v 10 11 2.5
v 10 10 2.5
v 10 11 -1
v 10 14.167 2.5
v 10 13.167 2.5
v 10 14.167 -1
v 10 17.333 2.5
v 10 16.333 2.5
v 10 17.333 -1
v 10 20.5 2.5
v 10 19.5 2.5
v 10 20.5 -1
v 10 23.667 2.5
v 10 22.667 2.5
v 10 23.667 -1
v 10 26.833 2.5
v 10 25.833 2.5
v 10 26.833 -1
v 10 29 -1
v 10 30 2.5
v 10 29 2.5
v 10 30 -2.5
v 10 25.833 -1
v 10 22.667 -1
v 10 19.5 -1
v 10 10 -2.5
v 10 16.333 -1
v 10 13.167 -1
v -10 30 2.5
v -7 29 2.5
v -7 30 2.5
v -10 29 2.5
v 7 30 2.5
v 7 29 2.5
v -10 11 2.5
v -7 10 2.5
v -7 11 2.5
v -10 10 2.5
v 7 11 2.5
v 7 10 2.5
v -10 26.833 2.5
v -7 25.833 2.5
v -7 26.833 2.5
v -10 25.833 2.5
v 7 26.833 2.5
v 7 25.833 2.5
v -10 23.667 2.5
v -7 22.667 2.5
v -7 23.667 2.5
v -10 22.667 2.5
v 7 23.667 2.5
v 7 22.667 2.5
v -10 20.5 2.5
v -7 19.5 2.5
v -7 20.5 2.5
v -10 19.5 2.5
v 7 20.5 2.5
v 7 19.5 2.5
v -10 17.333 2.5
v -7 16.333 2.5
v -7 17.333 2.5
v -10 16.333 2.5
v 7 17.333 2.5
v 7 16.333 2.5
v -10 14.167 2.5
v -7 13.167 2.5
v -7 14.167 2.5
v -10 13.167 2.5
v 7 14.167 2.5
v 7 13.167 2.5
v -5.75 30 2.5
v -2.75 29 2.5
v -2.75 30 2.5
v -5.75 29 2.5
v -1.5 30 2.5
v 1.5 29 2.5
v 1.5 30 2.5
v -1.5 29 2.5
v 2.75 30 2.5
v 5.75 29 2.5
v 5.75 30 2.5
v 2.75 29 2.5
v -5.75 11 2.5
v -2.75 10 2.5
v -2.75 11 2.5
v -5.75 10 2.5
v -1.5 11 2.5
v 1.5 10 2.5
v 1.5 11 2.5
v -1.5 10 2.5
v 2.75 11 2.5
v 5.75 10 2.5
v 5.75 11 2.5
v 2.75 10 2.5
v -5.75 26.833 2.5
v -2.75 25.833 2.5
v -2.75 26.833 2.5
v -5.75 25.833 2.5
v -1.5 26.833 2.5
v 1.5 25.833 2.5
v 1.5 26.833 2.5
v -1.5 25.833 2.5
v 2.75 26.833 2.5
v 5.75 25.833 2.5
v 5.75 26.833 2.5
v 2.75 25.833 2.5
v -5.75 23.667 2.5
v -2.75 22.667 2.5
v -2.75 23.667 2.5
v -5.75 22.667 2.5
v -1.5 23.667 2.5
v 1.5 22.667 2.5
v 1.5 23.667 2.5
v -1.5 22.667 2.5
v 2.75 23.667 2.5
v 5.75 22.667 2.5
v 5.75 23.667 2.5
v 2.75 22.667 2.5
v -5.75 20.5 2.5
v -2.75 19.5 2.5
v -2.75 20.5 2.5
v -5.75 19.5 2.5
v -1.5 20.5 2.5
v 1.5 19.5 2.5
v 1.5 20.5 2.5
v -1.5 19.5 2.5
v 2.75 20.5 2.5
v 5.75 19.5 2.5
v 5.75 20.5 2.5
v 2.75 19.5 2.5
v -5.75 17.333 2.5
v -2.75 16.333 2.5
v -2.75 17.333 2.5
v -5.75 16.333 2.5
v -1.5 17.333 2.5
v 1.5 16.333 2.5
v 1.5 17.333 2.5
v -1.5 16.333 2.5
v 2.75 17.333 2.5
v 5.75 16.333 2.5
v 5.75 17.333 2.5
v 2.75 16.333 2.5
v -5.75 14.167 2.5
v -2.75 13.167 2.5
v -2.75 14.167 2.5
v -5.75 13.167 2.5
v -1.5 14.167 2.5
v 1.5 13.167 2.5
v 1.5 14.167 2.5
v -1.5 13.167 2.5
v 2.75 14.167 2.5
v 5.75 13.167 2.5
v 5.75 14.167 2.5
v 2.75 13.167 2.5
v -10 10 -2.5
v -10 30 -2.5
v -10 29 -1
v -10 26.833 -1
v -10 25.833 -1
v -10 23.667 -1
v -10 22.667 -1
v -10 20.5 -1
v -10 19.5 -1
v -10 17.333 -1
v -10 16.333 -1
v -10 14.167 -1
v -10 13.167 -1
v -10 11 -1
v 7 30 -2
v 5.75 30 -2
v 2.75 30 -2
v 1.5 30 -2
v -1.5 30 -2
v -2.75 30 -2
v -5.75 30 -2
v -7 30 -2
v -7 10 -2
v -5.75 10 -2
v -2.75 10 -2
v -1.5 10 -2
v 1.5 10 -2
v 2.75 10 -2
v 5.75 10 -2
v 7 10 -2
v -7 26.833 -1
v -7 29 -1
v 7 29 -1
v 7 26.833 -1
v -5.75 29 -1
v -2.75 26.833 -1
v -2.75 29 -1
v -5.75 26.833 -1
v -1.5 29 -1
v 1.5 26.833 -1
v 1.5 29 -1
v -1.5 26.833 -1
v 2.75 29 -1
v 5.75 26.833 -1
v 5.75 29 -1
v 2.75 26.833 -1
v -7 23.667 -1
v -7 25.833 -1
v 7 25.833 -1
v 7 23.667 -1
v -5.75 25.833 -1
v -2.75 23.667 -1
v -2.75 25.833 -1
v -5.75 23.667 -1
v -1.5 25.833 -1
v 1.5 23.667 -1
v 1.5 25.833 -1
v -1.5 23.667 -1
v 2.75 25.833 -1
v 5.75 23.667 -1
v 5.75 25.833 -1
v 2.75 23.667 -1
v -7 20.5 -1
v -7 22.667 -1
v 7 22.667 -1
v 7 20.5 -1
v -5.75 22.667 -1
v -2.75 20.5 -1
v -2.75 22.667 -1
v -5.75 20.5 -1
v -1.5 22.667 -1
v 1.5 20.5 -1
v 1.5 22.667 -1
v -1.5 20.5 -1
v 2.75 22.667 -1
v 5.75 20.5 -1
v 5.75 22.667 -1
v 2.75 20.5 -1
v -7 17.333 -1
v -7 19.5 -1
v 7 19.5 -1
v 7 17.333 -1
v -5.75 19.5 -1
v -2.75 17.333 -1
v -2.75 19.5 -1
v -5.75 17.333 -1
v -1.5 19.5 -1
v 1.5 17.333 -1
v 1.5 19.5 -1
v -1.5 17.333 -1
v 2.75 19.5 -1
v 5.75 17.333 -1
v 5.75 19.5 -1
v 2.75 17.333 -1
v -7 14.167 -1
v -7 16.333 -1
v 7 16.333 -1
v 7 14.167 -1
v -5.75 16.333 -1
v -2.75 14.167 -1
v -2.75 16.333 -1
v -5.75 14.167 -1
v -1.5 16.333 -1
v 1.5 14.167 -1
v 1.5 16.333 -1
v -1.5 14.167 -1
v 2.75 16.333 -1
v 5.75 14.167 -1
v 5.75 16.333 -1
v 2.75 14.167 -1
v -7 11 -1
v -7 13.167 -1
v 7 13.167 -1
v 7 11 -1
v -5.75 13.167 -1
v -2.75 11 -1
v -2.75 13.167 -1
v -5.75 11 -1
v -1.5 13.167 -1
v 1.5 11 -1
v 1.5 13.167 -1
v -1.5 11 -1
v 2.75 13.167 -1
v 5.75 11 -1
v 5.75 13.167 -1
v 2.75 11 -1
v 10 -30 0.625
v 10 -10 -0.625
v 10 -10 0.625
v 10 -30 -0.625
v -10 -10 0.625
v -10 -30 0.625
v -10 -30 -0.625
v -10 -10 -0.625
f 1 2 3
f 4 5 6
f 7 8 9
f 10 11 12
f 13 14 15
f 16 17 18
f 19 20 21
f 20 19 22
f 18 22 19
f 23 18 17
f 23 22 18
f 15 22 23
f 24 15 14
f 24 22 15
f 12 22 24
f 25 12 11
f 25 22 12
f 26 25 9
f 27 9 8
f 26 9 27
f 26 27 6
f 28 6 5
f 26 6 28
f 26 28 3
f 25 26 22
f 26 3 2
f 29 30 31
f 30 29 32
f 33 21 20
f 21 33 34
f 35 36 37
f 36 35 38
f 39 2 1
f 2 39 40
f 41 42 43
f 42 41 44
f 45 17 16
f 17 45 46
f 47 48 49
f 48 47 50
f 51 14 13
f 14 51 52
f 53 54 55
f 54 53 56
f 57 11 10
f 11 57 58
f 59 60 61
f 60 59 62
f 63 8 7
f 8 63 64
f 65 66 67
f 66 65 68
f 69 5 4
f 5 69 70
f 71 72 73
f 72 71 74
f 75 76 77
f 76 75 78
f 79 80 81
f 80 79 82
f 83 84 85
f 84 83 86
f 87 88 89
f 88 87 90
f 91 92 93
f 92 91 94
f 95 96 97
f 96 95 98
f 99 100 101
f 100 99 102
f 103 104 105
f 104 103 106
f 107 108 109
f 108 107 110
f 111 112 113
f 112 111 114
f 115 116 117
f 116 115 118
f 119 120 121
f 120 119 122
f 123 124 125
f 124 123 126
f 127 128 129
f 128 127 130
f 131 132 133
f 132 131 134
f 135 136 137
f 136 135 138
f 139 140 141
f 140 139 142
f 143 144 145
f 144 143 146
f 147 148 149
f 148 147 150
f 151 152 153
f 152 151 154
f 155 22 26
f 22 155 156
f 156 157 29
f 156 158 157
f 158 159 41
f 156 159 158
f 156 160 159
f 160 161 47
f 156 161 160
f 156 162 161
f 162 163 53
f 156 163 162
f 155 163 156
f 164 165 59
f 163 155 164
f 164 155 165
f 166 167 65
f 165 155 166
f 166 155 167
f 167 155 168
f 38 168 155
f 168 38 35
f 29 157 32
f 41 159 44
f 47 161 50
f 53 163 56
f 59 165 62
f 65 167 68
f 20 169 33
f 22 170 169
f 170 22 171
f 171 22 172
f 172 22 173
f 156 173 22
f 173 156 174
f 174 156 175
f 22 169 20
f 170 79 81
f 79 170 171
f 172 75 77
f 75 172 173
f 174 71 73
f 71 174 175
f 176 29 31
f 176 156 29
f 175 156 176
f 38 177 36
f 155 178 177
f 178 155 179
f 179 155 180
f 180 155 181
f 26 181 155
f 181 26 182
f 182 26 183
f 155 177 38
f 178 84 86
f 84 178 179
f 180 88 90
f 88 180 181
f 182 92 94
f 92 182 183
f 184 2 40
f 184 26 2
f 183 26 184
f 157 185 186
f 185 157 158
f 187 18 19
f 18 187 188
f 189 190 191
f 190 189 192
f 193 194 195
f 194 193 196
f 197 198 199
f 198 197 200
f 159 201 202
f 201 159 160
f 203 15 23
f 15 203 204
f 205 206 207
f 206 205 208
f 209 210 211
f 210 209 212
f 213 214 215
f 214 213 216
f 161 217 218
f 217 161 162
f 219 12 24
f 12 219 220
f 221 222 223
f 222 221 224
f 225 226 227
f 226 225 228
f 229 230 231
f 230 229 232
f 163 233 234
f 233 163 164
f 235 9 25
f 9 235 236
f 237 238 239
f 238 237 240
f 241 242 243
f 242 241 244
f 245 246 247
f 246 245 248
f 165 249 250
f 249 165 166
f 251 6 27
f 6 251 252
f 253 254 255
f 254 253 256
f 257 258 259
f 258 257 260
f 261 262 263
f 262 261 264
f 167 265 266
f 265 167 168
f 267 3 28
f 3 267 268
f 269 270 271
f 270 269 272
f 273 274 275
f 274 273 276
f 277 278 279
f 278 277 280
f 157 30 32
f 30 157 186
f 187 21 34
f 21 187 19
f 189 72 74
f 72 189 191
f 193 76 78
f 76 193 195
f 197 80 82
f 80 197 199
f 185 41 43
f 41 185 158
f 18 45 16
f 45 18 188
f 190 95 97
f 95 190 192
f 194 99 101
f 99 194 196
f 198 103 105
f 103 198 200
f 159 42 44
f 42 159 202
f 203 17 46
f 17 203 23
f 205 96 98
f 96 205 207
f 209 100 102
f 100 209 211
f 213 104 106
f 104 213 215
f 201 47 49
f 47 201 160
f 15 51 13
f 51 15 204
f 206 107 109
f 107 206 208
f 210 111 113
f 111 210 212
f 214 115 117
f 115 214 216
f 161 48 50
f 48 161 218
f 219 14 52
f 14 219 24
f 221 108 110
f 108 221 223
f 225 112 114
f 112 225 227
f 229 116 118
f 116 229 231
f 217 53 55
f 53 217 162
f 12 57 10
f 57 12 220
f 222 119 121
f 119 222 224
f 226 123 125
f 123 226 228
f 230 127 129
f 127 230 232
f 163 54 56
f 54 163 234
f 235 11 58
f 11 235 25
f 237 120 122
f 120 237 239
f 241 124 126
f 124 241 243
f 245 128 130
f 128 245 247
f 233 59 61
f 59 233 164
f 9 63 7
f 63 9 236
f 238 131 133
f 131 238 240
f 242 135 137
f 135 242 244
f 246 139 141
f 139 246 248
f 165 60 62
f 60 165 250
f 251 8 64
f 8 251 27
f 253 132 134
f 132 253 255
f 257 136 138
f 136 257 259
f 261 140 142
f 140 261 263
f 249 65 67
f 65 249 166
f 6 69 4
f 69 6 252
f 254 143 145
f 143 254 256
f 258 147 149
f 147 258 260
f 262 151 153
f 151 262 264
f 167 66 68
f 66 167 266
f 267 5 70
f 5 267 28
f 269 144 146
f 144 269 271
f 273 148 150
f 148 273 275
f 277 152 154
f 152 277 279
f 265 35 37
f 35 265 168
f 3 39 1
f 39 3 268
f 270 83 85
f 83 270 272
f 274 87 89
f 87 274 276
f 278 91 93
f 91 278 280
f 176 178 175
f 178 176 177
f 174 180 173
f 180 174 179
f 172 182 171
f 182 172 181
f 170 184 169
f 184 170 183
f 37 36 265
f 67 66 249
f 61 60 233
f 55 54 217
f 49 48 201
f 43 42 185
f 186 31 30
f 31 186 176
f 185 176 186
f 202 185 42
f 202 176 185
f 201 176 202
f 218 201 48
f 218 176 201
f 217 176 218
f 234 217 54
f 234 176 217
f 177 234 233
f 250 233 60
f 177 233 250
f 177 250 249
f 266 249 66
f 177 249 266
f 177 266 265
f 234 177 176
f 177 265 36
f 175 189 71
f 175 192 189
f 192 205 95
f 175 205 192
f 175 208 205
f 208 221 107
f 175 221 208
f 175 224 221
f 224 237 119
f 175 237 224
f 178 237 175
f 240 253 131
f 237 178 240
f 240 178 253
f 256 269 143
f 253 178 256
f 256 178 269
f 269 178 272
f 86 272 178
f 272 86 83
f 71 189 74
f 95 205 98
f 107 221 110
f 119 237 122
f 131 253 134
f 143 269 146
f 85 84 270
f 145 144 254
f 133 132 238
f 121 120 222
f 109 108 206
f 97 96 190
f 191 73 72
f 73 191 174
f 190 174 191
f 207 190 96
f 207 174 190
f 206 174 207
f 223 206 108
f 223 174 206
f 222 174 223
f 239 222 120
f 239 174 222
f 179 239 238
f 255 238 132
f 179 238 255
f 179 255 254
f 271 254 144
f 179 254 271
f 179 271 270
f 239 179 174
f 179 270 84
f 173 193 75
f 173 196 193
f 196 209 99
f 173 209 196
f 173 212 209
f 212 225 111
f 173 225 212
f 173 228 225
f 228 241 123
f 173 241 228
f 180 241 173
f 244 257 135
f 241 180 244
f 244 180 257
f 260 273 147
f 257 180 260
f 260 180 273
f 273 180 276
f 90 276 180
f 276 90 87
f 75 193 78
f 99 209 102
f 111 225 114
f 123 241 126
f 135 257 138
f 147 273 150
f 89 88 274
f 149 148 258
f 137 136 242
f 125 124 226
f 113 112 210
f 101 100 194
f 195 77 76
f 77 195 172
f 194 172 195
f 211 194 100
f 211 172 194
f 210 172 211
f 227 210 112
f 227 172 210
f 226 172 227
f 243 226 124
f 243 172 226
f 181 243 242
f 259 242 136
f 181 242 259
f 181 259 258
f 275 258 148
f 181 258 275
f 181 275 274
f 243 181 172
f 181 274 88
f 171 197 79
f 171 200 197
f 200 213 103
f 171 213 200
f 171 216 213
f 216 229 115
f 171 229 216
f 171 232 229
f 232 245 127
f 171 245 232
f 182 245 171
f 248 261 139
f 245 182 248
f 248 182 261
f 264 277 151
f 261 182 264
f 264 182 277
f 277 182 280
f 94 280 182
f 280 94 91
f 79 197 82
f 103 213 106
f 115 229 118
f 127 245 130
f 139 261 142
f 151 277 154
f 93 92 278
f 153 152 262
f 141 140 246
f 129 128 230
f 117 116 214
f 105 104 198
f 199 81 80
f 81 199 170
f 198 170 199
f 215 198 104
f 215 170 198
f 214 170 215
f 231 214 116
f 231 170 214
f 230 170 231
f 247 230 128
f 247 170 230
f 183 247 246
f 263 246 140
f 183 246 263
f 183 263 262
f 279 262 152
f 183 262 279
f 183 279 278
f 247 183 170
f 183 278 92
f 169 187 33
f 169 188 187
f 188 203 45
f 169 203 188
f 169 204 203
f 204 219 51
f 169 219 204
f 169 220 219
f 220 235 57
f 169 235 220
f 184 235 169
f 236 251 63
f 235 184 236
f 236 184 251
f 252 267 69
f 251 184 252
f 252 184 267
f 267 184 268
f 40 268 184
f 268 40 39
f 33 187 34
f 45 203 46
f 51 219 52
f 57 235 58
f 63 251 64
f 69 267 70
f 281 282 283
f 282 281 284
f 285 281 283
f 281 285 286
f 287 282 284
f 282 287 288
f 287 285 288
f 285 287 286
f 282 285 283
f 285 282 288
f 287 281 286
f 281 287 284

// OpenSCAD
// file: ../globals.scad
// Copyright (c) 2017 Clément Bœsch <u pkh.me>
//
// Permission to use, copy, modify, and distribute this software for any
// purpose with or without fee is hereby granted, provided that the above
// copyright notice and this permission notice appear in all copies.
//
// THE SOFTWARE IS PROVIDED "AS IS" AND THE AUTHOR DISCLAIMS ALL WARRANTIES
// WITH REGARD TO THIS SOFTWARE INCLUDING ALL IMPLIED WARRANTIES OF
// MERCHANTABILITY AND FITNESS. IN NO EVENT SHALL THE AUTHOR BE LIABLE FOR
// ANY SPECIAL, DIRECT, INDIRECT, OR CONSEQUENTIAL DAMAGES OR ANY DAMAGES
// WHATSOEVER RESULTING FROM LOSS OF USE, DATA OR PROFITS, WHETHER IN AN
// ACTION OF CONTRACT, NEGLIGENCE OR OTHER TORTIOUS ACTION, ARISING OUT OF
// OR IN CONNECTION WITH THE USE OR PERFORMANCE OF THIS SOFTWARE.

$fn = 30;

_delta = 0.005;

c_black        = [.17,.17,.17];
c_black_redish = [.35,.30,.30];
c_gold         = [.75,.55,.00];
c_gray         = [.40,.40,.40];
c_darkgray     = [.25,.25,.25];
c_green_pcb    = [.00,.50,.25];
c_metal        = [.70,.70,.70];
c_yellow       = [.70,.70,.30];
c_darkblue     = [.20,.30,.40];
// file: _internal.scad
// Copyright (c) 2017 Clément Bœsch <u pkh.me>
//
// Permission to use, copy, modify, and distribute this software for any
// purpose with or without fee is hereby granted, provided that the above
// copyright notice and this permission notice appear in all copies.
//
// THE SOFTWARE IS PROVIDED "AS IS" AND THE AUTHOR DISCLAIMS ALL WARRANTIES
// WITH REGARD TO THIS SOFTWARE INCLUDING ALL IMPLIED WARRANTIES OF
// MERCHANTABILITY AND FITNESS. IN NO EVENT SHALL THE AUTHOR BE LIABLE FOR
// ANY SPECIAL, DIRECT, INDIRECT, OR CONSEQUENTIAL DAMAGES OR ANY DAMAGES
// WHATSOEVER RESULTING FROM LOSS OF USE, DATA OR PROFITS, WHETHER IN AN
// ACTION OF CONTRACT, NEGLIGENCE OR OTHER TORTIOUS ACTION, ARISING OUT OF
// OR IN CONNECTION WITH THE USE OR PERFORMANCE OF THIS SOFTWARE.

include <../globals.scad>

$vpr = [50, 0, 90];

module components_demo(pad=30) {
    n = $children;
    cols = ceil(sqrt(n));
    rows = ceil(n / cols);
    offx = pad * (rows - 1) / 2;
    offy = pad * (cols - 1) / 2;
    for (i = [0:n-1]) {
        x = floor(i / cols);
        y = i % cols;
        translate([x*pad - offx, y*pad - offy])
            rotate(360 * $t)
                children(i);
    }
}
// main file
// Copyright (c) 2017 Clément Bœsch <u pkh.me>
//
// Permission to use, copy, modify, and distribute this software for any
// purpose with or without fee is hereby granted, provided that the above
// copyright notice and this permission notice appear in all copies.
//
// THE SOFTWARE IS PROVIDED "AS IS" AND THE AUTHOR DISCLAIMS ALL WARRANTIES
// WITH REGARD TO THIS SOFTWARE INCLUDING ALL IMPLIED WARRANTIES OF
// MERCHANTABILITY AND FITNESS. IN NO EVENT SHALL THE AUTHOR BE LIABLE FOR
// ANY SPECIAL, DIRECT, INDIRECT, OR CONSEQUENTIAL DAMAGES OR ANY DAMAGES
// WHATSOEVER RESULTING FROM LOSS OF USE, DATA OR PROFITS, WHETHER IN AN
// ACTION OF CONTRACT, NEGLIGENCE OR OTHER TORTIOUS ACTION, ARISING OUT OF
// OR IN CONNECTION WITH THE USE OR PERFORMANCE OF THIS SOFTWARE.

include <_internal.scad>

$vpd = 180;

module cpu(dim=[20, 20, 1.25], clr=c_black) {
    color(clr)
        cube(dim, center=true);
}

module cpurad(dim=[20, 20, 5], stick_dim=[3, 1]) {
    translate(dim * -.5) // XXX
    color(c_black_redish) {
        difference() {
            cube(dim);

            // horizontal
            hh = 3.5;
            nb_hcut = 6;
            hpad = (dim[1] - (nb_hcut + 1) * stick_dim[1]) / nb_hcut;
            translate([0, 0, dim[2]-hh])
                linear_extrude(height=hh + _delta, convexity=4)
                    for (y = [0:nb_hcut-1])
                        translate([-_delta/2, (y + 1) * stick_dim[1] + y * hpad])
                            square([dim[0]+_delta, hpad]);

            // vertical
            nb_vcut = 4;
            vpad = (dim[0] - (nb_vcut + 1) * stick_dim[0]) / nb_vcut;
            hv = 4.5;
            translate([0, 0, dim[2]-hv])
                linear_extrude(height=hv + _delta, convexity=4)
                    for (x = [0:nb_vcut-1])
                        translate([(x + 1) * stick_dim[0] + x * vpad, -_delta/2])
                            square([vpad, dim[1]+_delta]);
        }
    }
}

function cpu_info() = [
    ["category", "cpu"],
    ["watch", "nowhere"],
];
function cpurad_info() = cpu_info();

components_demo(pad=40) {
    cpu();
    cpurad();
}
